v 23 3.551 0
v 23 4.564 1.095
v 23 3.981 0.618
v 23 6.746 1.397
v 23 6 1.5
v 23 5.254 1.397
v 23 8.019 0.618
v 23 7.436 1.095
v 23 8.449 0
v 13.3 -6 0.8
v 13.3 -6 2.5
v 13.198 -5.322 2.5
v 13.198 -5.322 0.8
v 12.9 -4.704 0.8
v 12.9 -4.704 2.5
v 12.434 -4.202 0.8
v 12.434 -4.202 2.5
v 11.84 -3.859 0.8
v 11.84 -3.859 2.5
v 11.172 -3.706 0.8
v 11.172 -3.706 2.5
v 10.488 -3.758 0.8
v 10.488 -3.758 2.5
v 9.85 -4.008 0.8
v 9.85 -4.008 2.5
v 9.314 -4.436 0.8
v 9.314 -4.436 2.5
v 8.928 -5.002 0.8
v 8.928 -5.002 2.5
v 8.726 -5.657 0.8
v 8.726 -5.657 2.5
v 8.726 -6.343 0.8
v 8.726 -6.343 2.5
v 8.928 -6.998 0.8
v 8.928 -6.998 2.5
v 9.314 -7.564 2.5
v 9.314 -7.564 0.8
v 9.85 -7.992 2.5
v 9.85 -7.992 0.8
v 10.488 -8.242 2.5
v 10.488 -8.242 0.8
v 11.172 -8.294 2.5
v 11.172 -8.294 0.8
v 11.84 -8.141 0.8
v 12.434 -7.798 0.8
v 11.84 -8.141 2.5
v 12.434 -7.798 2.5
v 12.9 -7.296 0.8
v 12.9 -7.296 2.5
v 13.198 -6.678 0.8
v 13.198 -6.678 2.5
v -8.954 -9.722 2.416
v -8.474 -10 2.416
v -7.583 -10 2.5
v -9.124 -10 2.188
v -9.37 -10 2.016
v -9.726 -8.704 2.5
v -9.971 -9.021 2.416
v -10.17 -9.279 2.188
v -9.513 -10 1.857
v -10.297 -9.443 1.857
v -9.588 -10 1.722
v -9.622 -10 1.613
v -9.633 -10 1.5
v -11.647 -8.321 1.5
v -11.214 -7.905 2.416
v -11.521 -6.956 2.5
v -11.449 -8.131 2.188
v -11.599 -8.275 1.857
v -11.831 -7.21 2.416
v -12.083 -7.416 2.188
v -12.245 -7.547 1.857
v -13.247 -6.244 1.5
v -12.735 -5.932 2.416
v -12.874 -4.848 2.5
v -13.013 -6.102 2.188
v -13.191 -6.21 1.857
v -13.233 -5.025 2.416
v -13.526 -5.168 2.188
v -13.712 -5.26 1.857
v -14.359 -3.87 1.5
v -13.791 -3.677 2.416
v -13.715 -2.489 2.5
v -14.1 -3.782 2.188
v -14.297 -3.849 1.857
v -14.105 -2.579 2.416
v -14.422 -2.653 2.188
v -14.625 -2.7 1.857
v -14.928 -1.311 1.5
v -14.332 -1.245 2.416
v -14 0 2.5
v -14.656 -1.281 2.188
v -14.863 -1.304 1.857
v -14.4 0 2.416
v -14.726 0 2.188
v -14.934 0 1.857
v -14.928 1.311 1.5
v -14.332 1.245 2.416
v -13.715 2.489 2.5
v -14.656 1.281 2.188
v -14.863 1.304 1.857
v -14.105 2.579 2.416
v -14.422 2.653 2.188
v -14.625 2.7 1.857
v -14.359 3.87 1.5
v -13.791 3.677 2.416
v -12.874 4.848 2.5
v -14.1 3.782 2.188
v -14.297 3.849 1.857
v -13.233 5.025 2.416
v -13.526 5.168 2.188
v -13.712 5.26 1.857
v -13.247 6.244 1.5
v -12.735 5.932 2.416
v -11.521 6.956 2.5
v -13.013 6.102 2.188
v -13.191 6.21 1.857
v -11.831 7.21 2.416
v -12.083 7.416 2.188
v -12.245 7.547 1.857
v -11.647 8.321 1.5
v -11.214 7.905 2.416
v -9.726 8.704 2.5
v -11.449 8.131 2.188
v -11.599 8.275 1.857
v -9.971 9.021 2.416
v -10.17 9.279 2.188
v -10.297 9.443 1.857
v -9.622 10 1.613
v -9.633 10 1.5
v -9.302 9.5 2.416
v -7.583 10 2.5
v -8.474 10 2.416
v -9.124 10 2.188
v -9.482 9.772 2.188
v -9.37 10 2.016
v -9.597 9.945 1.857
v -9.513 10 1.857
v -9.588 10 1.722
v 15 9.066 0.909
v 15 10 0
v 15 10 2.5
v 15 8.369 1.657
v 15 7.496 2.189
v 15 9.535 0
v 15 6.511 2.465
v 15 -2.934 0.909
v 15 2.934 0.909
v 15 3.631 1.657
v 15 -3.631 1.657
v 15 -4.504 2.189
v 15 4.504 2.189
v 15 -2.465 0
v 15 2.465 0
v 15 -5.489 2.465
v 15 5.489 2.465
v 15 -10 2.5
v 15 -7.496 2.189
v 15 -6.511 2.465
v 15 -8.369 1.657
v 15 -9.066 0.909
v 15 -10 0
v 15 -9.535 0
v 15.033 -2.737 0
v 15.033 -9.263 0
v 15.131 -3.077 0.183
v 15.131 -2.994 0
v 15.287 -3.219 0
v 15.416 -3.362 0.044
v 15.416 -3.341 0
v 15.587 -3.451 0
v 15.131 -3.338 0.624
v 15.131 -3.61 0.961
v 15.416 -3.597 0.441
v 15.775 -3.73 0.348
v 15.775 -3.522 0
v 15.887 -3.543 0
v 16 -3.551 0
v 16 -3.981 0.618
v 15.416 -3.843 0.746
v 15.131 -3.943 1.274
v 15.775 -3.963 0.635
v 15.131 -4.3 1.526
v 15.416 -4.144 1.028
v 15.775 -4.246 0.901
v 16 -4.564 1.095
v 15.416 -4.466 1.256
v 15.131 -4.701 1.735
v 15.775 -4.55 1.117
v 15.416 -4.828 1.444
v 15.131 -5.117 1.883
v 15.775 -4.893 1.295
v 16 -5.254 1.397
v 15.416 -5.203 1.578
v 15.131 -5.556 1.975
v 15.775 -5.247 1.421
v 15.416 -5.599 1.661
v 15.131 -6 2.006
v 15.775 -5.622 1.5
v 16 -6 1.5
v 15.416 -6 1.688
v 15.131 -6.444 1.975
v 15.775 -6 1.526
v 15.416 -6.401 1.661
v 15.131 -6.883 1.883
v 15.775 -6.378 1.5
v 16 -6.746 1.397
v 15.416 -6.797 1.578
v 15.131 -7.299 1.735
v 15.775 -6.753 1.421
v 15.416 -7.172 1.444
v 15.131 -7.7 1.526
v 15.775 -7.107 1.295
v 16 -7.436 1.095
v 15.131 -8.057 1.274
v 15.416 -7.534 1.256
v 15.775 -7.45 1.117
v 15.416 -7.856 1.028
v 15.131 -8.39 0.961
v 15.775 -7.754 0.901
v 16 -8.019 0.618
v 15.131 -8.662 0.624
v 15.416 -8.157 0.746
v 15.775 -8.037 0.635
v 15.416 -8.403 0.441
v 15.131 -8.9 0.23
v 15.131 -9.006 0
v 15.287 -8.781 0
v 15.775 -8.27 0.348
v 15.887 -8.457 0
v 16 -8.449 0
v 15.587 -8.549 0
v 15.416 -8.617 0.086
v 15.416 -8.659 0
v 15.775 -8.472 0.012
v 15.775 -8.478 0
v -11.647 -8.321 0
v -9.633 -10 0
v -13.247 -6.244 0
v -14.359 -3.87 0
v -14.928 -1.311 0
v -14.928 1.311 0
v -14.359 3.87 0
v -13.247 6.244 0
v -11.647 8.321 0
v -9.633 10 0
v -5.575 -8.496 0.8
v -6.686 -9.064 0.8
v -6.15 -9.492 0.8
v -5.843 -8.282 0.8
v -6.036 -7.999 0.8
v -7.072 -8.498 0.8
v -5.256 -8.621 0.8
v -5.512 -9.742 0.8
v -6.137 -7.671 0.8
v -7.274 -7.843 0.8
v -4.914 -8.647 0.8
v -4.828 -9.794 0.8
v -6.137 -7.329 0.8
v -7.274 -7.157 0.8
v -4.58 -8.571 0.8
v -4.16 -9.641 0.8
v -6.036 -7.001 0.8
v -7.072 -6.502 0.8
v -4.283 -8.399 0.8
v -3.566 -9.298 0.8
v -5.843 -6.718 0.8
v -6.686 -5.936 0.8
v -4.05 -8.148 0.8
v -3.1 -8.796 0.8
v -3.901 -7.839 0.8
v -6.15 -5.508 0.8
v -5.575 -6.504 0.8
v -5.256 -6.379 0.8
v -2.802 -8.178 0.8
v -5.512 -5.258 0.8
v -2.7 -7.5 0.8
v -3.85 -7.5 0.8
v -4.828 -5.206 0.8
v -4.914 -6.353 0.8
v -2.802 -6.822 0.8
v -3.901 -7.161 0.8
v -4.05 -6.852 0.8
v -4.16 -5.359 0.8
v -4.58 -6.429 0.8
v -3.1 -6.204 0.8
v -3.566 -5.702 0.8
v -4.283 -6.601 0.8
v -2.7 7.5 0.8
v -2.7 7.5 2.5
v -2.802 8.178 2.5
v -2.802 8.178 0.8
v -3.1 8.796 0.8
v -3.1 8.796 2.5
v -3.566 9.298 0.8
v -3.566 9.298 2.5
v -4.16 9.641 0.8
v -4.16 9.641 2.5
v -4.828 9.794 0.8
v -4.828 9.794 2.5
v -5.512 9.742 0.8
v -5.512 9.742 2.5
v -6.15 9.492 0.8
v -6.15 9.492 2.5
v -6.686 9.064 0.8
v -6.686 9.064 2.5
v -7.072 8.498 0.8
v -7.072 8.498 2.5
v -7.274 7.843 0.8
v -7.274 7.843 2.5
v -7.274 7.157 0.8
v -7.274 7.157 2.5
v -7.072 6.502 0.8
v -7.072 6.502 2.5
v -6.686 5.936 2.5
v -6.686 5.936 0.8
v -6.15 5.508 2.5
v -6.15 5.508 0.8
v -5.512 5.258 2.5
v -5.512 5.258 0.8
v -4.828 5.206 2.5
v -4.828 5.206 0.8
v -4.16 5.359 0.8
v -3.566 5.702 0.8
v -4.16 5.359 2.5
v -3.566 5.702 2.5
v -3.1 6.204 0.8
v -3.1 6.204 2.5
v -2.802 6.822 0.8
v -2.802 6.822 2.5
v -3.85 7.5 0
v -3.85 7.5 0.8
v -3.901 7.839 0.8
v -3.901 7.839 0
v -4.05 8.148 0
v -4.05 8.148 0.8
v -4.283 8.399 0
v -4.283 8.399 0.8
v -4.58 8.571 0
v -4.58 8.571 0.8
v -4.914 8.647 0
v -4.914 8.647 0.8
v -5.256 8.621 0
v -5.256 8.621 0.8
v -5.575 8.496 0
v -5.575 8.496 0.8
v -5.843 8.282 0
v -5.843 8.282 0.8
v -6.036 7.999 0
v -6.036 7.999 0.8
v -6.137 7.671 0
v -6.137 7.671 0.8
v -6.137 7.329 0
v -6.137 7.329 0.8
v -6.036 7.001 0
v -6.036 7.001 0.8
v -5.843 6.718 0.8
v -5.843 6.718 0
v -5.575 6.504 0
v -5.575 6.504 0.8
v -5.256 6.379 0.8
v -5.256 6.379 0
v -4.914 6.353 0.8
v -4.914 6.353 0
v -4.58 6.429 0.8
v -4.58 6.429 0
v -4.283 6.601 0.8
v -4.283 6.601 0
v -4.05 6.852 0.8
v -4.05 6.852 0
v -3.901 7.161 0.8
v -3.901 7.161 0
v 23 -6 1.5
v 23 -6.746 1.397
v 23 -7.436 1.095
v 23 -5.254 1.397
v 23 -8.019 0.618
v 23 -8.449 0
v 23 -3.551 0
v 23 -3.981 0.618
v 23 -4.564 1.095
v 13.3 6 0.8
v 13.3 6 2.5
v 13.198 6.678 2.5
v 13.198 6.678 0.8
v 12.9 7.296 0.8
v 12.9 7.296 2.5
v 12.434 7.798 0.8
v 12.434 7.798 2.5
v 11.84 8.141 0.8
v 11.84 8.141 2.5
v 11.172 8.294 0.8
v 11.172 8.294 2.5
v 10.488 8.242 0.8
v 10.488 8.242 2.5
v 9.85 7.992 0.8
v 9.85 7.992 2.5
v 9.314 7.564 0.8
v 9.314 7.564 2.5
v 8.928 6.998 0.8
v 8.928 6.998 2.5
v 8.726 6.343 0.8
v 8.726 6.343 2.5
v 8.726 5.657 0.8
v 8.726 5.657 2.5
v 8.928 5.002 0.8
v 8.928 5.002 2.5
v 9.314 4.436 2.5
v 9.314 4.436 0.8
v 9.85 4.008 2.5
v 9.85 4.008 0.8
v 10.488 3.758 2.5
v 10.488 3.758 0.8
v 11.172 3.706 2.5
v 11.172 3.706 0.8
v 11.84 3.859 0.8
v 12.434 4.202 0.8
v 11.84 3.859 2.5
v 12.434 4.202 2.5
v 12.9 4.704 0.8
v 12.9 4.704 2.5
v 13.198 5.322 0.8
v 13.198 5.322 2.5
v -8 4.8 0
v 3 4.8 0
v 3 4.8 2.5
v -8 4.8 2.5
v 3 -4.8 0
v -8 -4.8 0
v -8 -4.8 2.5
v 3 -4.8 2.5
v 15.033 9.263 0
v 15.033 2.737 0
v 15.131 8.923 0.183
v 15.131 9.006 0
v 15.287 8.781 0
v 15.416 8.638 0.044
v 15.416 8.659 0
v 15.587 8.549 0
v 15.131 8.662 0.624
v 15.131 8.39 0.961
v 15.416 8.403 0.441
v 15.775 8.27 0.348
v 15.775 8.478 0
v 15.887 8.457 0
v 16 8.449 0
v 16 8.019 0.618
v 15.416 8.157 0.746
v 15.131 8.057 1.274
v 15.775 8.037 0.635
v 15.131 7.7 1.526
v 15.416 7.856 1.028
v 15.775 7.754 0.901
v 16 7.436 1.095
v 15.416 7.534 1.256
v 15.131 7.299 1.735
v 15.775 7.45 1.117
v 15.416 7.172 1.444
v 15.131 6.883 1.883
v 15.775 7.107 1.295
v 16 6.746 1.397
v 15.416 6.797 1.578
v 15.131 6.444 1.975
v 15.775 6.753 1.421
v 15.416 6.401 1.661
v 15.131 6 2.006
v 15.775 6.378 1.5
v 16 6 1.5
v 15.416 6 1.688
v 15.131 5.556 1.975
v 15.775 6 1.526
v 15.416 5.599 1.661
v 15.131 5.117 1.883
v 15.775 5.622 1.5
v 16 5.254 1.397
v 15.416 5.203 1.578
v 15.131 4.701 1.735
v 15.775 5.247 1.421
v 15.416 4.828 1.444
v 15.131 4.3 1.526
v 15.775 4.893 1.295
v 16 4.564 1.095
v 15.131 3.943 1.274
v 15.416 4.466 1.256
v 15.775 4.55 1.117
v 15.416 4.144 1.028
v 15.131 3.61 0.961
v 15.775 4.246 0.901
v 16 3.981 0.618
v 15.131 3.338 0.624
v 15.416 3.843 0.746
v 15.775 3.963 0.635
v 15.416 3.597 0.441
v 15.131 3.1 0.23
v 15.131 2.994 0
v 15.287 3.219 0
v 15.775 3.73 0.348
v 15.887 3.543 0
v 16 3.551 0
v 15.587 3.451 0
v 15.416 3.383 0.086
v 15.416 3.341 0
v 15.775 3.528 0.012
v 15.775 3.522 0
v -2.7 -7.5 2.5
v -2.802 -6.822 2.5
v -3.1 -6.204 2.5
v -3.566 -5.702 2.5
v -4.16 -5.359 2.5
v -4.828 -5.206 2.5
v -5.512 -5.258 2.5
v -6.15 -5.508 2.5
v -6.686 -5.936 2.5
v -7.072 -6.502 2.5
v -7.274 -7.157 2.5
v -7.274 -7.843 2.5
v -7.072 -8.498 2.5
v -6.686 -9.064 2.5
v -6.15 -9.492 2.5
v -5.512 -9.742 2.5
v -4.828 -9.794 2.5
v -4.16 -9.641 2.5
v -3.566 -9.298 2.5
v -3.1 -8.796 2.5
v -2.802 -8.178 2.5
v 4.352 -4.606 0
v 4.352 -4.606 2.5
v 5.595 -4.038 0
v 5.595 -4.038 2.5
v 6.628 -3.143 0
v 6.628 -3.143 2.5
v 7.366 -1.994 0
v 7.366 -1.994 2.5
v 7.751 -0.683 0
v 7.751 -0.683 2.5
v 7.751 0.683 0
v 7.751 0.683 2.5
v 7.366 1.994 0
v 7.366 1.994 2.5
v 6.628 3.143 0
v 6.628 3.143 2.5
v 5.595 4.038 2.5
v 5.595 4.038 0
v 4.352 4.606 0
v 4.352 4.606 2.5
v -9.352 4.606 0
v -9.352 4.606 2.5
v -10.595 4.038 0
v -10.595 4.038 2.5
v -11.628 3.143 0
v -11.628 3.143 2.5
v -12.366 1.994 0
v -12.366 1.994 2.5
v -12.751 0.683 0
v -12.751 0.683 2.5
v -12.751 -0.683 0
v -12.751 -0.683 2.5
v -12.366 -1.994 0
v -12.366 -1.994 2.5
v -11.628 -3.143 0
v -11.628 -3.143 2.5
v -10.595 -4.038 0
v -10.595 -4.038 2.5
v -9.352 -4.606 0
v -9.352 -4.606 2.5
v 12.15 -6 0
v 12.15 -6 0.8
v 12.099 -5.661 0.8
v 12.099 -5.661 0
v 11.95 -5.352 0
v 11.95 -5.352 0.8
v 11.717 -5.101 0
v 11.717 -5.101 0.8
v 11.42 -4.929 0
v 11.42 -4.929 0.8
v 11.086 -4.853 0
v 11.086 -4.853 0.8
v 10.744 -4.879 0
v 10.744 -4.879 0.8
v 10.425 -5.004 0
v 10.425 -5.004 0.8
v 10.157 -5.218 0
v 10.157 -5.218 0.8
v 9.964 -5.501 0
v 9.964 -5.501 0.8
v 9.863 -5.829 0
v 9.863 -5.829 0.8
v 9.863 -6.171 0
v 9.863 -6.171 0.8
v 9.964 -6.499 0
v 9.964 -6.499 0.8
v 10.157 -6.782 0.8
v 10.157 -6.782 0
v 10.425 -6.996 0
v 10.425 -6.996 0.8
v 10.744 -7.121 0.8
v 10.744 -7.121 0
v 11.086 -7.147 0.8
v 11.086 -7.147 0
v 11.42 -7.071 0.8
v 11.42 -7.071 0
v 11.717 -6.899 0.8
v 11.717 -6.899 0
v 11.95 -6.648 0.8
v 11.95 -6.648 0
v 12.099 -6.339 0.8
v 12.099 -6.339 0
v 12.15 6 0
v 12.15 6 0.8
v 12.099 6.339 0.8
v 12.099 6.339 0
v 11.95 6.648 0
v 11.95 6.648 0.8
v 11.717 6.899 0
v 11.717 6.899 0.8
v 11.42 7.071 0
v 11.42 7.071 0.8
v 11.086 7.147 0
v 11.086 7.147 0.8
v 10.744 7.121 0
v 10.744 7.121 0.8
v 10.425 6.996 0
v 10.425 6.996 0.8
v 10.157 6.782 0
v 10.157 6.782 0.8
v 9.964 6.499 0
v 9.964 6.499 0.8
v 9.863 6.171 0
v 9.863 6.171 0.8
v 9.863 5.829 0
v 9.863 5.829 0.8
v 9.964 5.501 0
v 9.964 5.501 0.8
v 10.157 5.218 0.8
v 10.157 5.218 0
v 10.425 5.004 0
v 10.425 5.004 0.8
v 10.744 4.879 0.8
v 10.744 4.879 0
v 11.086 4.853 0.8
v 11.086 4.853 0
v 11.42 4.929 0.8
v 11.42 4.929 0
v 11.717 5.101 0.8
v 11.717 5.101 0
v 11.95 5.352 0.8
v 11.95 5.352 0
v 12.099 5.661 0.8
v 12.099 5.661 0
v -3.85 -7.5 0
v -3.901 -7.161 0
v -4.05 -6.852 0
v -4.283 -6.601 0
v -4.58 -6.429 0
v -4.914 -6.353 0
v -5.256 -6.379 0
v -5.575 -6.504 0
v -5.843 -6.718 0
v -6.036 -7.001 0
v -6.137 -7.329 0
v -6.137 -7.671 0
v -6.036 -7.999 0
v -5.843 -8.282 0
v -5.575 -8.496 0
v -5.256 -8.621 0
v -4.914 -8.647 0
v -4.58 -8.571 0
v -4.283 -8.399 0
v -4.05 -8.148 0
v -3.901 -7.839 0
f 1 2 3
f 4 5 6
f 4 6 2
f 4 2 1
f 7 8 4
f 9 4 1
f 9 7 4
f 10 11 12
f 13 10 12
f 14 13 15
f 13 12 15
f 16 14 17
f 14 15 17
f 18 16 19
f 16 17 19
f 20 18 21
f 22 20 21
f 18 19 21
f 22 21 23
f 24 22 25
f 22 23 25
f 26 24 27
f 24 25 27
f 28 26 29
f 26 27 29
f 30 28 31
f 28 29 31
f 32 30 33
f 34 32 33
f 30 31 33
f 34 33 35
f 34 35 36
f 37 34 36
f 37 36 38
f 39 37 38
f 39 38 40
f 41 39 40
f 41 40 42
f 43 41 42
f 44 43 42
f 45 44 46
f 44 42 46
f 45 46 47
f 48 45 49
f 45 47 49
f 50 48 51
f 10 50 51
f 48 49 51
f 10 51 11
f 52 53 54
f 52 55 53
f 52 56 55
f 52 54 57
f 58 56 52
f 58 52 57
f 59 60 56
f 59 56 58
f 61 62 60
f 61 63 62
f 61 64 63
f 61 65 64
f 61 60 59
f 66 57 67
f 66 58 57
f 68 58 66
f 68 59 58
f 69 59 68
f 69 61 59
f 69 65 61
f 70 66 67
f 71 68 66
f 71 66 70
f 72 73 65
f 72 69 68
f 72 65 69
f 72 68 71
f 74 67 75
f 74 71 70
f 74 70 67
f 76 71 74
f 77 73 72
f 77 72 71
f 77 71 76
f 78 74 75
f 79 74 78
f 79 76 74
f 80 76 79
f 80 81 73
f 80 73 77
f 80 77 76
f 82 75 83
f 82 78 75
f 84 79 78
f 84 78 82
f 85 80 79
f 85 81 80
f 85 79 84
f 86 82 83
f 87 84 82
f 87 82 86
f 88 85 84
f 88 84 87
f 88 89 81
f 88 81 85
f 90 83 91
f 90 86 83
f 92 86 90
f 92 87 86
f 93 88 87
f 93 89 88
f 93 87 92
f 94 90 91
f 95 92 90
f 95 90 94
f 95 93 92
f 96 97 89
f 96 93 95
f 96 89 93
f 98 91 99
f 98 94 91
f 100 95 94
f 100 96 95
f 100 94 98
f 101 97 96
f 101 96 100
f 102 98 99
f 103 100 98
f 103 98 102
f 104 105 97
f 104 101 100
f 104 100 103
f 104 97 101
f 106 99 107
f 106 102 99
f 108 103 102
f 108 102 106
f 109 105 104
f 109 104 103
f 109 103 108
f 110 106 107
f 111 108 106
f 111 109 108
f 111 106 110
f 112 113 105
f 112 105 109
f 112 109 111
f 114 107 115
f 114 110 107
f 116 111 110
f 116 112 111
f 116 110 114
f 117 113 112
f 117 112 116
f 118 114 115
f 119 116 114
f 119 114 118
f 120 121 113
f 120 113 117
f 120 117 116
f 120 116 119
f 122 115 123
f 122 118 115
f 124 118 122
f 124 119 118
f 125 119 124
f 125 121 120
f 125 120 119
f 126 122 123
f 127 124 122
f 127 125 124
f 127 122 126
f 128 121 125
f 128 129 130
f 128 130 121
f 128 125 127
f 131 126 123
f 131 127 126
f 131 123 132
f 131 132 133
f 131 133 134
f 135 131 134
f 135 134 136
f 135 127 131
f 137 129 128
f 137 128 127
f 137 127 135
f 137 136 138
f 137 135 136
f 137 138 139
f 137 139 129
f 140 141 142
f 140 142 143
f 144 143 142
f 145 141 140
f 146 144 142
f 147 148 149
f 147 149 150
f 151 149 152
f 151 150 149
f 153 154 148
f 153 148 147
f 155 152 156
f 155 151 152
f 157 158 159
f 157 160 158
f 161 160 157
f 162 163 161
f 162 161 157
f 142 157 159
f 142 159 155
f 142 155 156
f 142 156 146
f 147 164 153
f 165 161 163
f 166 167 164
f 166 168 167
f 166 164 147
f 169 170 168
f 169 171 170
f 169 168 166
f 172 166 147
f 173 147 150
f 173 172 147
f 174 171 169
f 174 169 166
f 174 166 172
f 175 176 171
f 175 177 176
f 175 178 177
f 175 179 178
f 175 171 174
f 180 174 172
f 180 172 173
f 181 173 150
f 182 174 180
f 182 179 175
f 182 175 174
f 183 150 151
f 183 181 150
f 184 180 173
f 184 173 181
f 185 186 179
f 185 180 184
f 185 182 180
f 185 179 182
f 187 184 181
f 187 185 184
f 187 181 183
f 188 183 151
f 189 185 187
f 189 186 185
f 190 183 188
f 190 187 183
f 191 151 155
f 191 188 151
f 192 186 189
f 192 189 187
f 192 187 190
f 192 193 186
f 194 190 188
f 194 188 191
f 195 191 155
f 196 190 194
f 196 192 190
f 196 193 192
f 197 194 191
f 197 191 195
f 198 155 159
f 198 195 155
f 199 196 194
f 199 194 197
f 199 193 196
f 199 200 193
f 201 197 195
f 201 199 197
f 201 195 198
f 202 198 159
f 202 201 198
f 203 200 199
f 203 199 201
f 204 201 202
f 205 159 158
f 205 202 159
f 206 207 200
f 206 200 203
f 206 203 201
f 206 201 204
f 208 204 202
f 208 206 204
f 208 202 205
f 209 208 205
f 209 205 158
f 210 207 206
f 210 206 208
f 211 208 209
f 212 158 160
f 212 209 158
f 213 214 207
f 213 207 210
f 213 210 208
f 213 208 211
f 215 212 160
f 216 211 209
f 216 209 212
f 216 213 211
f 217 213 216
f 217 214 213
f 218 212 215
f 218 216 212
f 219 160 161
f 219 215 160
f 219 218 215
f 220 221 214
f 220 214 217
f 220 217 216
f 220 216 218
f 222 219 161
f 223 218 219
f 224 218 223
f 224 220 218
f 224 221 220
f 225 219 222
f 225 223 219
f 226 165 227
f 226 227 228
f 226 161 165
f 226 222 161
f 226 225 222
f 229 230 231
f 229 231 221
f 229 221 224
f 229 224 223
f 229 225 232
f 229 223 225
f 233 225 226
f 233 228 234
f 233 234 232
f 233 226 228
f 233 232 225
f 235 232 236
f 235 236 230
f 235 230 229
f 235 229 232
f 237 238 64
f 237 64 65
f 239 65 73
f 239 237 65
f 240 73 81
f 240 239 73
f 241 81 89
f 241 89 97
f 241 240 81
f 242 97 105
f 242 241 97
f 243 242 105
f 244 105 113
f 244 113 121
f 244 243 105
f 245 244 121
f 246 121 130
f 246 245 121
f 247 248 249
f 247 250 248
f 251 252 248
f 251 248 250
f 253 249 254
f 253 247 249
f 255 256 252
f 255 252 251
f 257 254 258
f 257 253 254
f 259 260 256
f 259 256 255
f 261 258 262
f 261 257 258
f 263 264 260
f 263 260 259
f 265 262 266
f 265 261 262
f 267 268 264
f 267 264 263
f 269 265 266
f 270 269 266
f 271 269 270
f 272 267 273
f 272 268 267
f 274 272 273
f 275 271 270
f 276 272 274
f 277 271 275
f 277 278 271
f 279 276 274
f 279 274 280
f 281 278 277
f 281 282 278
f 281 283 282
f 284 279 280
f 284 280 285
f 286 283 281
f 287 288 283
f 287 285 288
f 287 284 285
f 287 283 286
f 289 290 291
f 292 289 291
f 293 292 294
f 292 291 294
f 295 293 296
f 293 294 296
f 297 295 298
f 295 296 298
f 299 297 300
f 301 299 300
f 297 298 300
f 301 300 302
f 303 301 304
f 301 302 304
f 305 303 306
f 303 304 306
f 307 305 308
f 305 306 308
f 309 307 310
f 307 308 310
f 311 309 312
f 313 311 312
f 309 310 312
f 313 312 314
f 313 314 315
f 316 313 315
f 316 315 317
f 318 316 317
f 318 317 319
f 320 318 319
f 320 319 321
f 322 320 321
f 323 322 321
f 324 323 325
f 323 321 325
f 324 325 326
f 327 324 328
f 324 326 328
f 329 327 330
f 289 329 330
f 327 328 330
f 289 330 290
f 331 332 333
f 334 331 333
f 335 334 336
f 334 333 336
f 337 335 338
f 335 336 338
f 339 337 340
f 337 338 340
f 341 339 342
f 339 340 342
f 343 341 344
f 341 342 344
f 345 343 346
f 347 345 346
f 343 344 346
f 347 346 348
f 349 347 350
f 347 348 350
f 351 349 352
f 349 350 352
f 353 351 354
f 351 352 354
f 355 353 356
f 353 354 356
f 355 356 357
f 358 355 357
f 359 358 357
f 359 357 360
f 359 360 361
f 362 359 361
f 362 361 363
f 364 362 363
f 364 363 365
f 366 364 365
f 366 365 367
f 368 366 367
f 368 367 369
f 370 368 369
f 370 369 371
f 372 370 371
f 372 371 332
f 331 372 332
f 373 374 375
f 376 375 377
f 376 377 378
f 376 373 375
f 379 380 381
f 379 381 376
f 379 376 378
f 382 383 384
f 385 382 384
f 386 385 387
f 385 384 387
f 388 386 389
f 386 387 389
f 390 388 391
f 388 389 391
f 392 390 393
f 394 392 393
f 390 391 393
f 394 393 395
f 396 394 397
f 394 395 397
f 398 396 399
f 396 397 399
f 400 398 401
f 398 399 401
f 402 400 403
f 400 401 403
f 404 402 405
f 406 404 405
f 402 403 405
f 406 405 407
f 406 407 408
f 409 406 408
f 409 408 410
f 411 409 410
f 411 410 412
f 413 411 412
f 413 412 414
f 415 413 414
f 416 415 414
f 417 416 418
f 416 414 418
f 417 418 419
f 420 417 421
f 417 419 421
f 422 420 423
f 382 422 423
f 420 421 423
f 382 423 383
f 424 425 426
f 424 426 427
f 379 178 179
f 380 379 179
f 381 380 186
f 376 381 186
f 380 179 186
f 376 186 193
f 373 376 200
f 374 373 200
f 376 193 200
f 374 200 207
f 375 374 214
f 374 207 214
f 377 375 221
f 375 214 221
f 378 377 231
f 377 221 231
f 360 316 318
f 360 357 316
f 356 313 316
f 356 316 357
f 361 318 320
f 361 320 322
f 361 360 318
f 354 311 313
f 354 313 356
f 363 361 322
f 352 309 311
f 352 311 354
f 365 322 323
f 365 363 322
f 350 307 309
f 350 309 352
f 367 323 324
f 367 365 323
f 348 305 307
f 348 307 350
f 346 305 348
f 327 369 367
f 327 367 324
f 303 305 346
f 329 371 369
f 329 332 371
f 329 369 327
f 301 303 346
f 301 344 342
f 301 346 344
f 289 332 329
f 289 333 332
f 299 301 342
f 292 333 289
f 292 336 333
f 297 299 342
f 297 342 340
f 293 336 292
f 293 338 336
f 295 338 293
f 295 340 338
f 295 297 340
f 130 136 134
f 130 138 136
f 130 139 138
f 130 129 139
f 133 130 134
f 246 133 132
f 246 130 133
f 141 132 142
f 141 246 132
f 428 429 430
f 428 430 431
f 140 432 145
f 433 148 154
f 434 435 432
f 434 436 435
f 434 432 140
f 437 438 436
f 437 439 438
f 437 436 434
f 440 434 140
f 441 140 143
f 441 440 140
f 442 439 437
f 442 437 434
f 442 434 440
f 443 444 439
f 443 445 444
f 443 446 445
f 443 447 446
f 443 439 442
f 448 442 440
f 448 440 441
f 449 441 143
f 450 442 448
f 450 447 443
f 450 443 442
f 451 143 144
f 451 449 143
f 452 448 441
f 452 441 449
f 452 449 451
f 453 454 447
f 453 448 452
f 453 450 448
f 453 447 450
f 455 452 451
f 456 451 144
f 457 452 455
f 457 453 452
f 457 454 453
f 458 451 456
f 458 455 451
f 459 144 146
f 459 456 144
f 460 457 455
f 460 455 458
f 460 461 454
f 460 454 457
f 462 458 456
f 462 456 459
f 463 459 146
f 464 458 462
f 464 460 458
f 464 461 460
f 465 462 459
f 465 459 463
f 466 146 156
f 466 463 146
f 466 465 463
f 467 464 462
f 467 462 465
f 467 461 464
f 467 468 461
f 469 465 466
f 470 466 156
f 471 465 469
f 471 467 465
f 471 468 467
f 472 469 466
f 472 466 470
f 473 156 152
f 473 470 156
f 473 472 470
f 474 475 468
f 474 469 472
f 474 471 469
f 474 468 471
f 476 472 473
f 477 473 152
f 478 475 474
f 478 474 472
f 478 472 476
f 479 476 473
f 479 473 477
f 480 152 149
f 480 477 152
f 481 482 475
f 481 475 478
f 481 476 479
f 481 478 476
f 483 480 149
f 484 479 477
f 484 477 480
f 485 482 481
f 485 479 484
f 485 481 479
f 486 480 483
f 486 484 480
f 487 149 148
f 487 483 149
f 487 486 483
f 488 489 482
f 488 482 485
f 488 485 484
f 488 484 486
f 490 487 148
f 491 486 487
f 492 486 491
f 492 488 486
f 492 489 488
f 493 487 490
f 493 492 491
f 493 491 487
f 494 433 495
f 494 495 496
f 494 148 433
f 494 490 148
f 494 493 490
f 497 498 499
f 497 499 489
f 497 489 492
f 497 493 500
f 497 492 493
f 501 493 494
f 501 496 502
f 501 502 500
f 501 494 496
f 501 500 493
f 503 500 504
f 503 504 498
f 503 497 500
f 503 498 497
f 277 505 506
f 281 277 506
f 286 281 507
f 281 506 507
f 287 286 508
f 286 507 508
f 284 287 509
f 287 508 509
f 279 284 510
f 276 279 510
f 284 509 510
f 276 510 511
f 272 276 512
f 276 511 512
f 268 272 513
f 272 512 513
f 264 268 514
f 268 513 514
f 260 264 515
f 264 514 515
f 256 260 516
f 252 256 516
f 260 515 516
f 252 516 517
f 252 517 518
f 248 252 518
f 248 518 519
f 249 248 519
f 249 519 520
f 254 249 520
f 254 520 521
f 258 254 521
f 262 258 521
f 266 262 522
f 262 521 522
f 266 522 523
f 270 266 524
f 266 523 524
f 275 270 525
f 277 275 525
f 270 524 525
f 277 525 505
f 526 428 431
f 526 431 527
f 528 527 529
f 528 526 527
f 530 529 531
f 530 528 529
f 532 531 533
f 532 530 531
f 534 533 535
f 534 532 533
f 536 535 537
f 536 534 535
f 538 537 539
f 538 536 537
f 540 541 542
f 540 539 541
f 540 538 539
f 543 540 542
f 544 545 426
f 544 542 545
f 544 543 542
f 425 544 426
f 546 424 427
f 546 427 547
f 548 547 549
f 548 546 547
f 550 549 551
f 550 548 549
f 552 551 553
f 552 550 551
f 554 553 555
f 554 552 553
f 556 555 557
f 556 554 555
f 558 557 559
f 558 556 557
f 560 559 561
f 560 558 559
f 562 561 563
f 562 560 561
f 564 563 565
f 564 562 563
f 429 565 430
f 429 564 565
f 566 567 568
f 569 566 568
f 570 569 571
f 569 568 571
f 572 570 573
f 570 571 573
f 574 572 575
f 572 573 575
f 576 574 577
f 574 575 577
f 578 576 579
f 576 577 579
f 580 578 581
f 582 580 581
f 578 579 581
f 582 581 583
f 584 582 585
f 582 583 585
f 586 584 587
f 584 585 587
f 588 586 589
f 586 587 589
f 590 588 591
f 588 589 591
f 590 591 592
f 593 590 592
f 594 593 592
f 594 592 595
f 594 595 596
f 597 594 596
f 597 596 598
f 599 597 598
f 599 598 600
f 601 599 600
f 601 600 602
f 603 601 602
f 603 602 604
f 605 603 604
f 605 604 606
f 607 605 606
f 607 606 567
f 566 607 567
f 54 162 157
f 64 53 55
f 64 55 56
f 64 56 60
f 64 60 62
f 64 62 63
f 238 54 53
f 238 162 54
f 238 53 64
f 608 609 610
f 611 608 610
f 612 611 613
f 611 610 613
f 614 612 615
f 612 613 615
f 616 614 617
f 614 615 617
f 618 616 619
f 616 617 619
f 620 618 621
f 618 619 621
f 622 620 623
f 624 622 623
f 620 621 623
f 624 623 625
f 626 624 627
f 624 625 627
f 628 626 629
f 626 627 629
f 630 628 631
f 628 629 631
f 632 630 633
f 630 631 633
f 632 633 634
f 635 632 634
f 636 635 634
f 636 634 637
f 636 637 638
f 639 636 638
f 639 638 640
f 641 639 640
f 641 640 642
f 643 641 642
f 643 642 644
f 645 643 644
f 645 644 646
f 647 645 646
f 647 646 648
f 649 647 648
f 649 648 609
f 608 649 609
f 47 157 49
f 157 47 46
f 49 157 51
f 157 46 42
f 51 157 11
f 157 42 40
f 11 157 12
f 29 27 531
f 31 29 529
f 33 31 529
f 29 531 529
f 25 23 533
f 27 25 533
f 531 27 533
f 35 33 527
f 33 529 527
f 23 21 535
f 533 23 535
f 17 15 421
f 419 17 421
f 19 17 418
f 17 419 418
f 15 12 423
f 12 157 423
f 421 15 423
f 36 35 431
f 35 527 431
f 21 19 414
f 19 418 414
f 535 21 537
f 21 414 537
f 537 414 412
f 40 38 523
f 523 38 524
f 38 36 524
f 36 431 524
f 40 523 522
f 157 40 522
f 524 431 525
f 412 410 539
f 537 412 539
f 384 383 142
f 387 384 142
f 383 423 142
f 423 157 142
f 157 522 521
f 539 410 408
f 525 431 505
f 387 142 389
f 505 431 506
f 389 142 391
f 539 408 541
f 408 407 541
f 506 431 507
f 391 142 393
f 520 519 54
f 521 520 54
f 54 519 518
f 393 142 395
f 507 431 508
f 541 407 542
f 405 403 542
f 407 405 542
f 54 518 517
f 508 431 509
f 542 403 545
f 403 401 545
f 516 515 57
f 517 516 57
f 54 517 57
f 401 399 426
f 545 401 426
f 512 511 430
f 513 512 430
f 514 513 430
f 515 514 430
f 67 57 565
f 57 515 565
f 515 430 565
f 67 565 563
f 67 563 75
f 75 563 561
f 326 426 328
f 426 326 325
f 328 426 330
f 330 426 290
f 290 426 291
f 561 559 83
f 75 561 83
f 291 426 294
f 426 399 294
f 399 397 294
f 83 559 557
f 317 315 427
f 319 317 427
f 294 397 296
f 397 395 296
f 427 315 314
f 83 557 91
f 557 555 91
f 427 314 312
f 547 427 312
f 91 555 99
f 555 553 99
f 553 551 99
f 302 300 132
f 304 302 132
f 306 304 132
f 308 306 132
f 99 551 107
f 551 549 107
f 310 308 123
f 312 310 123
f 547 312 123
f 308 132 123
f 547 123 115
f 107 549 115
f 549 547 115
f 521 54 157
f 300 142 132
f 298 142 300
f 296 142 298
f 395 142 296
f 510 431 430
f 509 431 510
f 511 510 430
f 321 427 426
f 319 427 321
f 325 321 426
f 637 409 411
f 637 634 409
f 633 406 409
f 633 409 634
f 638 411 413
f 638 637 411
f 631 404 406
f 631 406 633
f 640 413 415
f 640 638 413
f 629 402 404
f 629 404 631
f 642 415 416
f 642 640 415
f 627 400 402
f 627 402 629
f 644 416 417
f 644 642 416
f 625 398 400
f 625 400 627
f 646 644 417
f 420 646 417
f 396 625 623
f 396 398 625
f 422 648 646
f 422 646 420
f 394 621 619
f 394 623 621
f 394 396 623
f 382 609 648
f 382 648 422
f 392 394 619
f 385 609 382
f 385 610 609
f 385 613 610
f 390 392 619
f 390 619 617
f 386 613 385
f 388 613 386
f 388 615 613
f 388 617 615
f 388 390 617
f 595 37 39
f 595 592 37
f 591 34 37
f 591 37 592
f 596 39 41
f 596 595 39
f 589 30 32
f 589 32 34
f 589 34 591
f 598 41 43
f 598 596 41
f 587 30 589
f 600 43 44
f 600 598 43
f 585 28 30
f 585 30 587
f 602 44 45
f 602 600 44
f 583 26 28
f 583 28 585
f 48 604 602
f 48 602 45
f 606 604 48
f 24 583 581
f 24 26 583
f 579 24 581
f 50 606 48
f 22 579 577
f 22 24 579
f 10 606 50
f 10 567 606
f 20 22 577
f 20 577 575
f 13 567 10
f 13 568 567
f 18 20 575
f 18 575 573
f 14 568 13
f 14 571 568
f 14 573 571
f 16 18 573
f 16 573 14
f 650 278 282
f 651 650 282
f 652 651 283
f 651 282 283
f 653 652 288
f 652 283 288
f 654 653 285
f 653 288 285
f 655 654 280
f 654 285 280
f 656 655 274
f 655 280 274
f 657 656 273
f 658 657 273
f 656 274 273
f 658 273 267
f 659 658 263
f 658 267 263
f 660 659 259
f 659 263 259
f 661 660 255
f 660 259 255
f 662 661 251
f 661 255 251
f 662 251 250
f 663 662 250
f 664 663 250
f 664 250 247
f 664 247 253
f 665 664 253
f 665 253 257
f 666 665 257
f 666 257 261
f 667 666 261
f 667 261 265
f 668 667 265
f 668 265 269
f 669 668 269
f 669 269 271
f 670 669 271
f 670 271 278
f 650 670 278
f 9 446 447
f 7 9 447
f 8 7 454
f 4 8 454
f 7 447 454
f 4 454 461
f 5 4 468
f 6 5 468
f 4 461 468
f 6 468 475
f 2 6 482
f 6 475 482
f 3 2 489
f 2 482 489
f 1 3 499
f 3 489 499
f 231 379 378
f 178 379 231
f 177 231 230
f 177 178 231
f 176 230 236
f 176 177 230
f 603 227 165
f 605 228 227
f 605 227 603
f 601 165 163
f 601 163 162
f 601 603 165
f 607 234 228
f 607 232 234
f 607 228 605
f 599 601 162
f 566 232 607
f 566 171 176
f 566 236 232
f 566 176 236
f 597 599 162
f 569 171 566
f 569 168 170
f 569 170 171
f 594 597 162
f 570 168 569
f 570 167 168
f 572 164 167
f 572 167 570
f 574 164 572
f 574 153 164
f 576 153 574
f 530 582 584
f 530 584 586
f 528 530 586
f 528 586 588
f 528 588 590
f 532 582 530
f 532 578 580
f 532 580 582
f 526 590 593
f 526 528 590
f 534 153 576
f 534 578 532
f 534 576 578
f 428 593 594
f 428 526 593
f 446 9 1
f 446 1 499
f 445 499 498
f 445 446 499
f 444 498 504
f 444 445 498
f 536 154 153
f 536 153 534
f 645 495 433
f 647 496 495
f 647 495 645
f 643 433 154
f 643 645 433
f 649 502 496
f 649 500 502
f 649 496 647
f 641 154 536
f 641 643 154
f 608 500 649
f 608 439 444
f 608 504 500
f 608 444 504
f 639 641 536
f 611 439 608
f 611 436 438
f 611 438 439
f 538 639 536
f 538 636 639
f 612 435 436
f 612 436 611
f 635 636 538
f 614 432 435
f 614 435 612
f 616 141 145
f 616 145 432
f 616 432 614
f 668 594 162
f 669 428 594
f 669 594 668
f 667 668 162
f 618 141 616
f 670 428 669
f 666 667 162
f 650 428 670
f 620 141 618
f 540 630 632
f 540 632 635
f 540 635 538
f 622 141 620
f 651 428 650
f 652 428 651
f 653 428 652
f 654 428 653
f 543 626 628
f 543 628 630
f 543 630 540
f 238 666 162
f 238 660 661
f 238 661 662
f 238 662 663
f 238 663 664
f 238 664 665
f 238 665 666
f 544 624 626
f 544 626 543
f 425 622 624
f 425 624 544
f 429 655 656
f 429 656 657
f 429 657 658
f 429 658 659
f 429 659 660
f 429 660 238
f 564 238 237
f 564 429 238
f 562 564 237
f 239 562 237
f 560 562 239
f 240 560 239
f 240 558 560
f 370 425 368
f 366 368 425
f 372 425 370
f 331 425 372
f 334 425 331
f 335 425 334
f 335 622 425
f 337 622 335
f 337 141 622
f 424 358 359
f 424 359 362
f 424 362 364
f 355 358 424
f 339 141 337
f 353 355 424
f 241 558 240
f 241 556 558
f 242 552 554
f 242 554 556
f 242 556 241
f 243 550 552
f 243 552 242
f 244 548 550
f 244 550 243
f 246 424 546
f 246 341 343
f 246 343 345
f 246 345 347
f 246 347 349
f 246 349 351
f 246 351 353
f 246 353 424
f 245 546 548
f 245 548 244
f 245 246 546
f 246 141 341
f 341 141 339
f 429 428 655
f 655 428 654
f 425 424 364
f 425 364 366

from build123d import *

# Parameters (mm, degrees)
BOSS_EXTRUDE1_DEPTH = 2.5
BOSS_EXTRUDE2_DEPTH = 8
FILLET2_R           = 1
CUT_EXTRUDE1_DEPTH  = 8
SKETCH4_R           = 2.3
CUT_EXTRUDE2_DEPTH  = 1.7
SKETCH5_R           = 1.15
CUT_EXTRUDE3_DEPTH  = 26.137422433
FILLET3_R           = 1


with BuildPart() as part:
    # Sketch1 → Boss-Extrude1 (new body)
    with BuildSketch(Plane.XY):
        with BuildLine():
            Line((15, -10), (-9.633249581, -10))
            ThreePointArc((-9.633249581, -10), (-15, 0), (-9.633249581, 10))
            Line((-9.633249581, 10), (15, 10))
            Line((15, 10), (15, -10))
        make_face()
    extrude(amount=BOSS_EXTRUDE1_DEPTH)

    # Sketch2 → Boss-Extrude2 (add)
    with BuildSketch(Plane(origin=(15, 0, 0), x_dir=(0, 0, -1), z_dir=(1, 0, 0))):
        with BuildLine():
            Line((0, -8.449489743), (0, -3.550510257))
            ThreePointArc((0, -3.550510257), (-1.5, -6), (0, -8.449489743))
        make_face()
        with BuildLine():
            Line((0, 3.550510257), (0, 8.449489743))
            ThreePointArc((0, 8.449489743), (-1.5, 6), (0, 3.550510257))
        make_face()
    extrude(amount=BOSS_EXTRUDE2_DEPTH)

    # Fillet2
    fillet2_edges = [part.edges().sort_by_distance(p)[0] for p in [
        (15, -6, 1.5),
        (15, 6, 1.5),
    ]]
    fillet(fillet2_edges, radius=FILLET2_R - 0.0001)  # a hair under: the kernel refuses the full size

    # Sketch3 → Cut-Extrude1 (cut)
    with BuildSketch(Plane(origin=(0, 0, 0), x_dir=(-1, 0, 0), z_dir=(0, 0, -1))):
        with BuildLine():
            Line((8, -4.8), (-3, -4.8))
            ThreePointArc((-3, -4.8), (-7.8, 0), (-3, 4.8))
            Line((-3, 4.8), (8, 4.8))
            ThreePointArc((8, 4.8), (12.8, 0), (8, -4.8))
        make_face()
    extrude(amount=-CUT_EXTRUDE1_DEPTH, mode=Mode.SUBTRACT)

    # Sketch4 → Cut-Extrude2 (cut)
    with BuildSketch(Plane.XY.offset(2.5)):
        with Locations((-5, 7.5)):
            Circle(SKETCH4_R)
        with Locations((11, 6)):
            Circle(SKETCH4_R)
        with Locations((11, -6)):
            Circle(SKETCH4_R)
        with Locations((-5, -7.5)):
            Circle(SKETCH4_R)
    extrude(amount=-CUT_EXTRUDE2_DEPTH, mode=Mode.SUBTRACT)

    # Sketch5 → Cut-Extrude3 (cut, through all)
    with BuildSketch(Plane.XY.offset(0.8)):
        with Locations((-5, 7.5)):
            Circle(SKETCH5_R)
        with Locations((11, 6)):
            Circle(SKETCH5_R)
        with Locations((11, -6)):
            Circle(SKETCH5_R)
        with Locations((-5, -7.5)):
            Circle(SKETCH5_R)
    extrude(amount=-CUT_EXTRUDE3_DEPTH, mode=Mode.SUBTRACT)

    # Fillet3
    fillet3_edges = [part.edges().sort_by_distance(p)[0] for p in [
        (-15, 0, 2.5),
    ]]
    fillet(fillet3_edges, radius=FILLET3_R)


solid = part.part
